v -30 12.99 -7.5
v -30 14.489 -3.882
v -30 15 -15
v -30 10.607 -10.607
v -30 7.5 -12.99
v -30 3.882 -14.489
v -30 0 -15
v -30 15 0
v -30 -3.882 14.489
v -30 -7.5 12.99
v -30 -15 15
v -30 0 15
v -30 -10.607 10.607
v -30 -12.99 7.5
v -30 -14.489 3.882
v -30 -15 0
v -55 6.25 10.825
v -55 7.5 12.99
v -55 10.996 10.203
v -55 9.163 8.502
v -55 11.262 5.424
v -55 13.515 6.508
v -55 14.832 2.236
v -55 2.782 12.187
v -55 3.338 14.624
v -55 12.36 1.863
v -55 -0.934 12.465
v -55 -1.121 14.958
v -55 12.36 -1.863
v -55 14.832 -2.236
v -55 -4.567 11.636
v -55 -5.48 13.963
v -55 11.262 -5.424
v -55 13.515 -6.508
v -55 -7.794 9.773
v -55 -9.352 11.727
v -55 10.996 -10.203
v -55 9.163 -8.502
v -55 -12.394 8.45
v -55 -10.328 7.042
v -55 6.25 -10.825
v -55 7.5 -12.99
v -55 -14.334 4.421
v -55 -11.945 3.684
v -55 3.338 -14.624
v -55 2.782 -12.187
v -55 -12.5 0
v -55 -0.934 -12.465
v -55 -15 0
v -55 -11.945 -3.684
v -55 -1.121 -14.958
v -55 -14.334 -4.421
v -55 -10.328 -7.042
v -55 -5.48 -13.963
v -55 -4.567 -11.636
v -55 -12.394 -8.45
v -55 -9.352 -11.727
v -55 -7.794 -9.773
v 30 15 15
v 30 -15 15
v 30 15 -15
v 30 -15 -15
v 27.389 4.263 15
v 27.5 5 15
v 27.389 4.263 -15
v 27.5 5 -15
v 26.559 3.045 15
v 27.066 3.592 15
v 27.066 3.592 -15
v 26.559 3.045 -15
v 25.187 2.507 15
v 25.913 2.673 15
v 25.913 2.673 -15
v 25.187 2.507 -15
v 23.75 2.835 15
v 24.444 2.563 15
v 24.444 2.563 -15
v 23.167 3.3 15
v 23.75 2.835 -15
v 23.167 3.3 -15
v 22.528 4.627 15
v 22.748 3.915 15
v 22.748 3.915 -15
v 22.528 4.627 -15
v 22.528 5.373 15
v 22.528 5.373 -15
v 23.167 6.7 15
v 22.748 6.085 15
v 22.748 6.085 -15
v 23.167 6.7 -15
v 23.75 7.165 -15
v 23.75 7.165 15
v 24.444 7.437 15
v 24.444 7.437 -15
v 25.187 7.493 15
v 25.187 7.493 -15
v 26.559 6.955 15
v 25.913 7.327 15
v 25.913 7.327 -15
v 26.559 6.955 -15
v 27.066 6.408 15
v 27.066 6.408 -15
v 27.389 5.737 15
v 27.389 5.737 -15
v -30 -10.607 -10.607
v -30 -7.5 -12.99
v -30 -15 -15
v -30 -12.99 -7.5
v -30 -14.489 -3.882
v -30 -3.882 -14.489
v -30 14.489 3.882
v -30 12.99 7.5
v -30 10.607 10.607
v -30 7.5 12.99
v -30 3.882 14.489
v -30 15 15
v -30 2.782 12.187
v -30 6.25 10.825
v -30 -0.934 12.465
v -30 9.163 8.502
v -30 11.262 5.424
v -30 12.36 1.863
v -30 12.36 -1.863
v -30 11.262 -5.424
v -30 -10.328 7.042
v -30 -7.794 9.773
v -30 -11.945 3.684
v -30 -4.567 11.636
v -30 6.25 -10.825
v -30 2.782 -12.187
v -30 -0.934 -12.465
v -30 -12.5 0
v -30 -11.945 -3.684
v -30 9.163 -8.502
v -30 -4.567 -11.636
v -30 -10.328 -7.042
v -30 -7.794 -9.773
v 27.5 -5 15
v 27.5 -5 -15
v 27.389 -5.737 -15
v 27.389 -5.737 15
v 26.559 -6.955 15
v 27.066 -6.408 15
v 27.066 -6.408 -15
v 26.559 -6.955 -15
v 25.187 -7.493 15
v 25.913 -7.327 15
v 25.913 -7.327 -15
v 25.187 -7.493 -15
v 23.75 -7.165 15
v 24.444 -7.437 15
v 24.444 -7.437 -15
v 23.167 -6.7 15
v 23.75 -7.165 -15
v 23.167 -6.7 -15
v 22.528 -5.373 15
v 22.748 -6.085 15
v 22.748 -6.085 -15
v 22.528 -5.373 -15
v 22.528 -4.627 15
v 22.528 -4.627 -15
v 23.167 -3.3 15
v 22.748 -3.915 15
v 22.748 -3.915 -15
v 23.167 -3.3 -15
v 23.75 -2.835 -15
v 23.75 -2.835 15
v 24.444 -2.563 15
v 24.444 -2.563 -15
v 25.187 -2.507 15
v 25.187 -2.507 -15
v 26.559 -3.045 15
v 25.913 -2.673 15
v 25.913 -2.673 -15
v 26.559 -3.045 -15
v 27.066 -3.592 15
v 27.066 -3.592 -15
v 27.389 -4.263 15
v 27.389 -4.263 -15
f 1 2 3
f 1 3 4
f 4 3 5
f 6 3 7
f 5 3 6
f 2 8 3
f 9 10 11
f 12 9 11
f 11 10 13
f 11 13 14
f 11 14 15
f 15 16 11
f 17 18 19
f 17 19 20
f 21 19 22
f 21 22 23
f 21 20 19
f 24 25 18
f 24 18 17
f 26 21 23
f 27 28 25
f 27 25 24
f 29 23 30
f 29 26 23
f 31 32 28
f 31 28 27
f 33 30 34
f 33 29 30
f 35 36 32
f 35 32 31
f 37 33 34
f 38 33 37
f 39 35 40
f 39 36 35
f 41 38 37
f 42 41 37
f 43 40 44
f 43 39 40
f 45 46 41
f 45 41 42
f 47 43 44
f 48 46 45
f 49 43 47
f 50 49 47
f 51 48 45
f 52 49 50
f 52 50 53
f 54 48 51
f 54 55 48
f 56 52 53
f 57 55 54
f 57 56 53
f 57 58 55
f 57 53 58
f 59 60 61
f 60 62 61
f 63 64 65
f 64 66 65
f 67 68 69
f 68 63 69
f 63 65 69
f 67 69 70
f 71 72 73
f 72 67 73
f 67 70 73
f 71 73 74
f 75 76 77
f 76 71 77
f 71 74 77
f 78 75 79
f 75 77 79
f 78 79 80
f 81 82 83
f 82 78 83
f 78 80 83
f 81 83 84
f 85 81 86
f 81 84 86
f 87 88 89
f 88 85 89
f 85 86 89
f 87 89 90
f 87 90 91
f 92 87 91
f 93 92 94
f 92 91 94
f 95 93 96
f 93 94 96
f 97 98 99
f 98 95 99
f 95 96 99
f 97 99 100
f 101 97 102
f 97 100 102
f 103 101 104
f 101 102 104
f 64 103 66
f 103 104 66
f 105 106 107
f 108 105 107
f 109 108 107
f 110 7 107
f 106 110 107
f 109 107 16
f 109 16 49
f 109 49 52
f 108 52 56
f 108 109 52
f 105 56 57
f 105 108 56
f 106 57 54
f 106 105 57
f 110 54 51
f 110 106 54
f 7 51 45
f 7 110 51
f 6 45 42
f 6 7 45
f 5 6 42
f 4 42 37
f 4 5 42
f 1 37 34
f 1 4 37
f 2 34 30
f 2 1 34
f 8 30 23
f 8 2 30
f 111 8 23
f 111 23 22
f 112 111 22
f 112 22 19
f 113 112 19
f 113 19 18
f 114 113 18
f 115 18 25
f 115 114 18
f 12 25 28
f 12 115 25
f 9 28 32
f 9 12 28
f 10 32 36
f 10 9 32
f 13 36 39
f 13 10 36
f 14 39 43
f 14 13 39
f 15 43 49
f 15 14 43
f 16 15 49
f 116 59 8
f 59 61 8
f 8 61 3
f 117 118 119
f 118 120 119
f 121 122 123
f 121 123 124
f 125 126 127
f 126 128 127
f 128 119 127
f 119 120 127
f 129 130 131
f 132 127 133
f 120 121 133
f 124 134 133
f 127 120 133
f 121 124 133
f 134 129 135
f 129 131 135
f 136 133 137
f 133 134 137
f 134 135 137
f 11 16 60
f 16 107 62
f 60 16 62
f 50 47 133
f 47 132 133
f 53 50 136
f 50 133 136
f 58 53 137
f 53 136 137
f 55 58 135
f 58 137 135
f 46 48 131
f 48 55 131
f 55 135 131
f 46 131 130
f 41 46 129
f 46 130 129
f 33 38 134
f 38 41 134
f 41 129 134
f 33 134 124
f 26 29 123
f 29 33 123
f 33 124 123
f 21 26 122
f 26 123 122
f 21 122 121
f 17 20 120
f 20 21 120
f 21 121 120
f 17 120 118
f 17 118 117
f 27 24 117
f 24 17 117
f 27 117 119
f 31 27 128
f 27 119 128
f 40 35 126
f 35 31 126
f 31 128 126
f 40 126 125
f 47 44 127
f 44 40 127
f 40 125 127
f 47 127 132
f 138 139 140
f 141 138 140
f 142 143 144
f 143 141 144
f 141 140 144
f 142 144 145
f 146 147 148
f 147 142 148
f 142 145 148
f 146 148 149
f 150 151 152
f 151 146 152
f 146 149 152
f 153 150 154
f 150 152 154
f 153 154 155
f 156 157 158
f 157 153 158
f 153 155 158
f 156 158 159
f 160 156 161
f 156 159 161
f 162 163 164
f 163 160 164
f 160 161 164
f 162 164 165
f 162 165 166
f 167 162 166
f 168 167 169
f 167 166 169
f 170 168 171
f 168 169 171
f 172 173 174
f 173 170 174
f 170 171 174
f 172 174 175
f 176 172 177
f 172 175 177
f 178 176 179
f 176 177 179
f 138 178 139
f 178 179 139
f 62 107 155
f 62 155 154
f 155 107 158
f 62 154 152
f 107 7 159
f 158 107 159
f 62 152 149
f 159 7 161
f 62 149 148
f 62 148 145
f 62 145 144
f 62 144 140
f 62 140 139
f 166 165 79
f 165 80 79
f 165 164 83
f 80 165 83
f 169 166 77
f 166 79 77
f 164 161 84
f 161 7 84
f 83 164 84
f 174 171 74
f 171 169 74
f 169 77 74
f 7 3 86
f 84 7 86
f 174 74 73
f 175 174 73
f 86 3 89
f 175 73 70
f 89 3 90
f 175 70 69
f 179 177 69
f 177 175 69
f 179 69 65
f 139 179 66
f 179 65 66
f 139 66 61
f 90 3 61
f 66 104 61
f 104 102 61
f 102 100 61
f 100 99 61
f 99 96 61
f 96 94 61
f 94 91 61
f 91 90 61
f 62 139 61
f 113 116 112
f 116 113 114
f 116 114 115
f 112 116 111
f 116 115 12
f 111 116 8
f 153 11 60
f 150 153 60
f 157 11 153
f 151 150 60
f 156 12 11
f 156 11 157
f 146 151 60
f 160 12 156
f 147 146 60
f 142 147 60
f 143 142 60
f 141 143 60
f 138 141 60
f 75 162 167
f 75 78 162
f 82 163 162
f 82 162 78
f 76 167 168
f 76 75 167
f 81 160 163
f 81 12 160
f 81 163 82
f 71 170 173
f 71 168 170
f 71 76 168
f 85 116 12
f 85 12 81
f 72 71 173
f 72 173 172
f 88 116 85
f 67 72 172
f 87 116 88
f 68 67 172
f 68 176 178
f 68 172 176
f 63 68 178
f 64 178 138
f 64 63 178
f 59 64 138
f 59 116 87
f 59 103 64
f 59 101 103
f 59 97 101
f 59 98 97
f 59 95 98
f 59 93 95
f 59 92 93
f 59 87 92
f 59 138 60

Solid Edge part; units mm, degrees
sketch "Sketch1" plane through (0, 0, 0) normal (0, 0, 1) x (1, 0, 0)
  line L0 (-30, -15) -> (30, -15)
  line L1 (30, -15) -> (30, 15)
  line L2 (30, 15) -> (-30, 15)
  line L3 (-30, 15) -> (-30, -15)
  circle A0 centre (25, 5) radius 2.5
  circle A1 centre (25, -5) radius 2.5
extrude "Protrusion1" add sketch "Sketch1" along normal mid plane 30
sketch "Sketch2" plane through (-30, 0, 0) normal (-1, 0, 0) x (0, -1, 0)
  circle A0 centre (0, 0) radius 15
  circle A1 centre (0, 0) radius 12.5
extrude "ExtrudedProtrusion_2" add sketch "Sketch2" along normal mid plane 50
properties material "Steel - Stainless:1.4404 , X2CrNiMo17-12-2"
